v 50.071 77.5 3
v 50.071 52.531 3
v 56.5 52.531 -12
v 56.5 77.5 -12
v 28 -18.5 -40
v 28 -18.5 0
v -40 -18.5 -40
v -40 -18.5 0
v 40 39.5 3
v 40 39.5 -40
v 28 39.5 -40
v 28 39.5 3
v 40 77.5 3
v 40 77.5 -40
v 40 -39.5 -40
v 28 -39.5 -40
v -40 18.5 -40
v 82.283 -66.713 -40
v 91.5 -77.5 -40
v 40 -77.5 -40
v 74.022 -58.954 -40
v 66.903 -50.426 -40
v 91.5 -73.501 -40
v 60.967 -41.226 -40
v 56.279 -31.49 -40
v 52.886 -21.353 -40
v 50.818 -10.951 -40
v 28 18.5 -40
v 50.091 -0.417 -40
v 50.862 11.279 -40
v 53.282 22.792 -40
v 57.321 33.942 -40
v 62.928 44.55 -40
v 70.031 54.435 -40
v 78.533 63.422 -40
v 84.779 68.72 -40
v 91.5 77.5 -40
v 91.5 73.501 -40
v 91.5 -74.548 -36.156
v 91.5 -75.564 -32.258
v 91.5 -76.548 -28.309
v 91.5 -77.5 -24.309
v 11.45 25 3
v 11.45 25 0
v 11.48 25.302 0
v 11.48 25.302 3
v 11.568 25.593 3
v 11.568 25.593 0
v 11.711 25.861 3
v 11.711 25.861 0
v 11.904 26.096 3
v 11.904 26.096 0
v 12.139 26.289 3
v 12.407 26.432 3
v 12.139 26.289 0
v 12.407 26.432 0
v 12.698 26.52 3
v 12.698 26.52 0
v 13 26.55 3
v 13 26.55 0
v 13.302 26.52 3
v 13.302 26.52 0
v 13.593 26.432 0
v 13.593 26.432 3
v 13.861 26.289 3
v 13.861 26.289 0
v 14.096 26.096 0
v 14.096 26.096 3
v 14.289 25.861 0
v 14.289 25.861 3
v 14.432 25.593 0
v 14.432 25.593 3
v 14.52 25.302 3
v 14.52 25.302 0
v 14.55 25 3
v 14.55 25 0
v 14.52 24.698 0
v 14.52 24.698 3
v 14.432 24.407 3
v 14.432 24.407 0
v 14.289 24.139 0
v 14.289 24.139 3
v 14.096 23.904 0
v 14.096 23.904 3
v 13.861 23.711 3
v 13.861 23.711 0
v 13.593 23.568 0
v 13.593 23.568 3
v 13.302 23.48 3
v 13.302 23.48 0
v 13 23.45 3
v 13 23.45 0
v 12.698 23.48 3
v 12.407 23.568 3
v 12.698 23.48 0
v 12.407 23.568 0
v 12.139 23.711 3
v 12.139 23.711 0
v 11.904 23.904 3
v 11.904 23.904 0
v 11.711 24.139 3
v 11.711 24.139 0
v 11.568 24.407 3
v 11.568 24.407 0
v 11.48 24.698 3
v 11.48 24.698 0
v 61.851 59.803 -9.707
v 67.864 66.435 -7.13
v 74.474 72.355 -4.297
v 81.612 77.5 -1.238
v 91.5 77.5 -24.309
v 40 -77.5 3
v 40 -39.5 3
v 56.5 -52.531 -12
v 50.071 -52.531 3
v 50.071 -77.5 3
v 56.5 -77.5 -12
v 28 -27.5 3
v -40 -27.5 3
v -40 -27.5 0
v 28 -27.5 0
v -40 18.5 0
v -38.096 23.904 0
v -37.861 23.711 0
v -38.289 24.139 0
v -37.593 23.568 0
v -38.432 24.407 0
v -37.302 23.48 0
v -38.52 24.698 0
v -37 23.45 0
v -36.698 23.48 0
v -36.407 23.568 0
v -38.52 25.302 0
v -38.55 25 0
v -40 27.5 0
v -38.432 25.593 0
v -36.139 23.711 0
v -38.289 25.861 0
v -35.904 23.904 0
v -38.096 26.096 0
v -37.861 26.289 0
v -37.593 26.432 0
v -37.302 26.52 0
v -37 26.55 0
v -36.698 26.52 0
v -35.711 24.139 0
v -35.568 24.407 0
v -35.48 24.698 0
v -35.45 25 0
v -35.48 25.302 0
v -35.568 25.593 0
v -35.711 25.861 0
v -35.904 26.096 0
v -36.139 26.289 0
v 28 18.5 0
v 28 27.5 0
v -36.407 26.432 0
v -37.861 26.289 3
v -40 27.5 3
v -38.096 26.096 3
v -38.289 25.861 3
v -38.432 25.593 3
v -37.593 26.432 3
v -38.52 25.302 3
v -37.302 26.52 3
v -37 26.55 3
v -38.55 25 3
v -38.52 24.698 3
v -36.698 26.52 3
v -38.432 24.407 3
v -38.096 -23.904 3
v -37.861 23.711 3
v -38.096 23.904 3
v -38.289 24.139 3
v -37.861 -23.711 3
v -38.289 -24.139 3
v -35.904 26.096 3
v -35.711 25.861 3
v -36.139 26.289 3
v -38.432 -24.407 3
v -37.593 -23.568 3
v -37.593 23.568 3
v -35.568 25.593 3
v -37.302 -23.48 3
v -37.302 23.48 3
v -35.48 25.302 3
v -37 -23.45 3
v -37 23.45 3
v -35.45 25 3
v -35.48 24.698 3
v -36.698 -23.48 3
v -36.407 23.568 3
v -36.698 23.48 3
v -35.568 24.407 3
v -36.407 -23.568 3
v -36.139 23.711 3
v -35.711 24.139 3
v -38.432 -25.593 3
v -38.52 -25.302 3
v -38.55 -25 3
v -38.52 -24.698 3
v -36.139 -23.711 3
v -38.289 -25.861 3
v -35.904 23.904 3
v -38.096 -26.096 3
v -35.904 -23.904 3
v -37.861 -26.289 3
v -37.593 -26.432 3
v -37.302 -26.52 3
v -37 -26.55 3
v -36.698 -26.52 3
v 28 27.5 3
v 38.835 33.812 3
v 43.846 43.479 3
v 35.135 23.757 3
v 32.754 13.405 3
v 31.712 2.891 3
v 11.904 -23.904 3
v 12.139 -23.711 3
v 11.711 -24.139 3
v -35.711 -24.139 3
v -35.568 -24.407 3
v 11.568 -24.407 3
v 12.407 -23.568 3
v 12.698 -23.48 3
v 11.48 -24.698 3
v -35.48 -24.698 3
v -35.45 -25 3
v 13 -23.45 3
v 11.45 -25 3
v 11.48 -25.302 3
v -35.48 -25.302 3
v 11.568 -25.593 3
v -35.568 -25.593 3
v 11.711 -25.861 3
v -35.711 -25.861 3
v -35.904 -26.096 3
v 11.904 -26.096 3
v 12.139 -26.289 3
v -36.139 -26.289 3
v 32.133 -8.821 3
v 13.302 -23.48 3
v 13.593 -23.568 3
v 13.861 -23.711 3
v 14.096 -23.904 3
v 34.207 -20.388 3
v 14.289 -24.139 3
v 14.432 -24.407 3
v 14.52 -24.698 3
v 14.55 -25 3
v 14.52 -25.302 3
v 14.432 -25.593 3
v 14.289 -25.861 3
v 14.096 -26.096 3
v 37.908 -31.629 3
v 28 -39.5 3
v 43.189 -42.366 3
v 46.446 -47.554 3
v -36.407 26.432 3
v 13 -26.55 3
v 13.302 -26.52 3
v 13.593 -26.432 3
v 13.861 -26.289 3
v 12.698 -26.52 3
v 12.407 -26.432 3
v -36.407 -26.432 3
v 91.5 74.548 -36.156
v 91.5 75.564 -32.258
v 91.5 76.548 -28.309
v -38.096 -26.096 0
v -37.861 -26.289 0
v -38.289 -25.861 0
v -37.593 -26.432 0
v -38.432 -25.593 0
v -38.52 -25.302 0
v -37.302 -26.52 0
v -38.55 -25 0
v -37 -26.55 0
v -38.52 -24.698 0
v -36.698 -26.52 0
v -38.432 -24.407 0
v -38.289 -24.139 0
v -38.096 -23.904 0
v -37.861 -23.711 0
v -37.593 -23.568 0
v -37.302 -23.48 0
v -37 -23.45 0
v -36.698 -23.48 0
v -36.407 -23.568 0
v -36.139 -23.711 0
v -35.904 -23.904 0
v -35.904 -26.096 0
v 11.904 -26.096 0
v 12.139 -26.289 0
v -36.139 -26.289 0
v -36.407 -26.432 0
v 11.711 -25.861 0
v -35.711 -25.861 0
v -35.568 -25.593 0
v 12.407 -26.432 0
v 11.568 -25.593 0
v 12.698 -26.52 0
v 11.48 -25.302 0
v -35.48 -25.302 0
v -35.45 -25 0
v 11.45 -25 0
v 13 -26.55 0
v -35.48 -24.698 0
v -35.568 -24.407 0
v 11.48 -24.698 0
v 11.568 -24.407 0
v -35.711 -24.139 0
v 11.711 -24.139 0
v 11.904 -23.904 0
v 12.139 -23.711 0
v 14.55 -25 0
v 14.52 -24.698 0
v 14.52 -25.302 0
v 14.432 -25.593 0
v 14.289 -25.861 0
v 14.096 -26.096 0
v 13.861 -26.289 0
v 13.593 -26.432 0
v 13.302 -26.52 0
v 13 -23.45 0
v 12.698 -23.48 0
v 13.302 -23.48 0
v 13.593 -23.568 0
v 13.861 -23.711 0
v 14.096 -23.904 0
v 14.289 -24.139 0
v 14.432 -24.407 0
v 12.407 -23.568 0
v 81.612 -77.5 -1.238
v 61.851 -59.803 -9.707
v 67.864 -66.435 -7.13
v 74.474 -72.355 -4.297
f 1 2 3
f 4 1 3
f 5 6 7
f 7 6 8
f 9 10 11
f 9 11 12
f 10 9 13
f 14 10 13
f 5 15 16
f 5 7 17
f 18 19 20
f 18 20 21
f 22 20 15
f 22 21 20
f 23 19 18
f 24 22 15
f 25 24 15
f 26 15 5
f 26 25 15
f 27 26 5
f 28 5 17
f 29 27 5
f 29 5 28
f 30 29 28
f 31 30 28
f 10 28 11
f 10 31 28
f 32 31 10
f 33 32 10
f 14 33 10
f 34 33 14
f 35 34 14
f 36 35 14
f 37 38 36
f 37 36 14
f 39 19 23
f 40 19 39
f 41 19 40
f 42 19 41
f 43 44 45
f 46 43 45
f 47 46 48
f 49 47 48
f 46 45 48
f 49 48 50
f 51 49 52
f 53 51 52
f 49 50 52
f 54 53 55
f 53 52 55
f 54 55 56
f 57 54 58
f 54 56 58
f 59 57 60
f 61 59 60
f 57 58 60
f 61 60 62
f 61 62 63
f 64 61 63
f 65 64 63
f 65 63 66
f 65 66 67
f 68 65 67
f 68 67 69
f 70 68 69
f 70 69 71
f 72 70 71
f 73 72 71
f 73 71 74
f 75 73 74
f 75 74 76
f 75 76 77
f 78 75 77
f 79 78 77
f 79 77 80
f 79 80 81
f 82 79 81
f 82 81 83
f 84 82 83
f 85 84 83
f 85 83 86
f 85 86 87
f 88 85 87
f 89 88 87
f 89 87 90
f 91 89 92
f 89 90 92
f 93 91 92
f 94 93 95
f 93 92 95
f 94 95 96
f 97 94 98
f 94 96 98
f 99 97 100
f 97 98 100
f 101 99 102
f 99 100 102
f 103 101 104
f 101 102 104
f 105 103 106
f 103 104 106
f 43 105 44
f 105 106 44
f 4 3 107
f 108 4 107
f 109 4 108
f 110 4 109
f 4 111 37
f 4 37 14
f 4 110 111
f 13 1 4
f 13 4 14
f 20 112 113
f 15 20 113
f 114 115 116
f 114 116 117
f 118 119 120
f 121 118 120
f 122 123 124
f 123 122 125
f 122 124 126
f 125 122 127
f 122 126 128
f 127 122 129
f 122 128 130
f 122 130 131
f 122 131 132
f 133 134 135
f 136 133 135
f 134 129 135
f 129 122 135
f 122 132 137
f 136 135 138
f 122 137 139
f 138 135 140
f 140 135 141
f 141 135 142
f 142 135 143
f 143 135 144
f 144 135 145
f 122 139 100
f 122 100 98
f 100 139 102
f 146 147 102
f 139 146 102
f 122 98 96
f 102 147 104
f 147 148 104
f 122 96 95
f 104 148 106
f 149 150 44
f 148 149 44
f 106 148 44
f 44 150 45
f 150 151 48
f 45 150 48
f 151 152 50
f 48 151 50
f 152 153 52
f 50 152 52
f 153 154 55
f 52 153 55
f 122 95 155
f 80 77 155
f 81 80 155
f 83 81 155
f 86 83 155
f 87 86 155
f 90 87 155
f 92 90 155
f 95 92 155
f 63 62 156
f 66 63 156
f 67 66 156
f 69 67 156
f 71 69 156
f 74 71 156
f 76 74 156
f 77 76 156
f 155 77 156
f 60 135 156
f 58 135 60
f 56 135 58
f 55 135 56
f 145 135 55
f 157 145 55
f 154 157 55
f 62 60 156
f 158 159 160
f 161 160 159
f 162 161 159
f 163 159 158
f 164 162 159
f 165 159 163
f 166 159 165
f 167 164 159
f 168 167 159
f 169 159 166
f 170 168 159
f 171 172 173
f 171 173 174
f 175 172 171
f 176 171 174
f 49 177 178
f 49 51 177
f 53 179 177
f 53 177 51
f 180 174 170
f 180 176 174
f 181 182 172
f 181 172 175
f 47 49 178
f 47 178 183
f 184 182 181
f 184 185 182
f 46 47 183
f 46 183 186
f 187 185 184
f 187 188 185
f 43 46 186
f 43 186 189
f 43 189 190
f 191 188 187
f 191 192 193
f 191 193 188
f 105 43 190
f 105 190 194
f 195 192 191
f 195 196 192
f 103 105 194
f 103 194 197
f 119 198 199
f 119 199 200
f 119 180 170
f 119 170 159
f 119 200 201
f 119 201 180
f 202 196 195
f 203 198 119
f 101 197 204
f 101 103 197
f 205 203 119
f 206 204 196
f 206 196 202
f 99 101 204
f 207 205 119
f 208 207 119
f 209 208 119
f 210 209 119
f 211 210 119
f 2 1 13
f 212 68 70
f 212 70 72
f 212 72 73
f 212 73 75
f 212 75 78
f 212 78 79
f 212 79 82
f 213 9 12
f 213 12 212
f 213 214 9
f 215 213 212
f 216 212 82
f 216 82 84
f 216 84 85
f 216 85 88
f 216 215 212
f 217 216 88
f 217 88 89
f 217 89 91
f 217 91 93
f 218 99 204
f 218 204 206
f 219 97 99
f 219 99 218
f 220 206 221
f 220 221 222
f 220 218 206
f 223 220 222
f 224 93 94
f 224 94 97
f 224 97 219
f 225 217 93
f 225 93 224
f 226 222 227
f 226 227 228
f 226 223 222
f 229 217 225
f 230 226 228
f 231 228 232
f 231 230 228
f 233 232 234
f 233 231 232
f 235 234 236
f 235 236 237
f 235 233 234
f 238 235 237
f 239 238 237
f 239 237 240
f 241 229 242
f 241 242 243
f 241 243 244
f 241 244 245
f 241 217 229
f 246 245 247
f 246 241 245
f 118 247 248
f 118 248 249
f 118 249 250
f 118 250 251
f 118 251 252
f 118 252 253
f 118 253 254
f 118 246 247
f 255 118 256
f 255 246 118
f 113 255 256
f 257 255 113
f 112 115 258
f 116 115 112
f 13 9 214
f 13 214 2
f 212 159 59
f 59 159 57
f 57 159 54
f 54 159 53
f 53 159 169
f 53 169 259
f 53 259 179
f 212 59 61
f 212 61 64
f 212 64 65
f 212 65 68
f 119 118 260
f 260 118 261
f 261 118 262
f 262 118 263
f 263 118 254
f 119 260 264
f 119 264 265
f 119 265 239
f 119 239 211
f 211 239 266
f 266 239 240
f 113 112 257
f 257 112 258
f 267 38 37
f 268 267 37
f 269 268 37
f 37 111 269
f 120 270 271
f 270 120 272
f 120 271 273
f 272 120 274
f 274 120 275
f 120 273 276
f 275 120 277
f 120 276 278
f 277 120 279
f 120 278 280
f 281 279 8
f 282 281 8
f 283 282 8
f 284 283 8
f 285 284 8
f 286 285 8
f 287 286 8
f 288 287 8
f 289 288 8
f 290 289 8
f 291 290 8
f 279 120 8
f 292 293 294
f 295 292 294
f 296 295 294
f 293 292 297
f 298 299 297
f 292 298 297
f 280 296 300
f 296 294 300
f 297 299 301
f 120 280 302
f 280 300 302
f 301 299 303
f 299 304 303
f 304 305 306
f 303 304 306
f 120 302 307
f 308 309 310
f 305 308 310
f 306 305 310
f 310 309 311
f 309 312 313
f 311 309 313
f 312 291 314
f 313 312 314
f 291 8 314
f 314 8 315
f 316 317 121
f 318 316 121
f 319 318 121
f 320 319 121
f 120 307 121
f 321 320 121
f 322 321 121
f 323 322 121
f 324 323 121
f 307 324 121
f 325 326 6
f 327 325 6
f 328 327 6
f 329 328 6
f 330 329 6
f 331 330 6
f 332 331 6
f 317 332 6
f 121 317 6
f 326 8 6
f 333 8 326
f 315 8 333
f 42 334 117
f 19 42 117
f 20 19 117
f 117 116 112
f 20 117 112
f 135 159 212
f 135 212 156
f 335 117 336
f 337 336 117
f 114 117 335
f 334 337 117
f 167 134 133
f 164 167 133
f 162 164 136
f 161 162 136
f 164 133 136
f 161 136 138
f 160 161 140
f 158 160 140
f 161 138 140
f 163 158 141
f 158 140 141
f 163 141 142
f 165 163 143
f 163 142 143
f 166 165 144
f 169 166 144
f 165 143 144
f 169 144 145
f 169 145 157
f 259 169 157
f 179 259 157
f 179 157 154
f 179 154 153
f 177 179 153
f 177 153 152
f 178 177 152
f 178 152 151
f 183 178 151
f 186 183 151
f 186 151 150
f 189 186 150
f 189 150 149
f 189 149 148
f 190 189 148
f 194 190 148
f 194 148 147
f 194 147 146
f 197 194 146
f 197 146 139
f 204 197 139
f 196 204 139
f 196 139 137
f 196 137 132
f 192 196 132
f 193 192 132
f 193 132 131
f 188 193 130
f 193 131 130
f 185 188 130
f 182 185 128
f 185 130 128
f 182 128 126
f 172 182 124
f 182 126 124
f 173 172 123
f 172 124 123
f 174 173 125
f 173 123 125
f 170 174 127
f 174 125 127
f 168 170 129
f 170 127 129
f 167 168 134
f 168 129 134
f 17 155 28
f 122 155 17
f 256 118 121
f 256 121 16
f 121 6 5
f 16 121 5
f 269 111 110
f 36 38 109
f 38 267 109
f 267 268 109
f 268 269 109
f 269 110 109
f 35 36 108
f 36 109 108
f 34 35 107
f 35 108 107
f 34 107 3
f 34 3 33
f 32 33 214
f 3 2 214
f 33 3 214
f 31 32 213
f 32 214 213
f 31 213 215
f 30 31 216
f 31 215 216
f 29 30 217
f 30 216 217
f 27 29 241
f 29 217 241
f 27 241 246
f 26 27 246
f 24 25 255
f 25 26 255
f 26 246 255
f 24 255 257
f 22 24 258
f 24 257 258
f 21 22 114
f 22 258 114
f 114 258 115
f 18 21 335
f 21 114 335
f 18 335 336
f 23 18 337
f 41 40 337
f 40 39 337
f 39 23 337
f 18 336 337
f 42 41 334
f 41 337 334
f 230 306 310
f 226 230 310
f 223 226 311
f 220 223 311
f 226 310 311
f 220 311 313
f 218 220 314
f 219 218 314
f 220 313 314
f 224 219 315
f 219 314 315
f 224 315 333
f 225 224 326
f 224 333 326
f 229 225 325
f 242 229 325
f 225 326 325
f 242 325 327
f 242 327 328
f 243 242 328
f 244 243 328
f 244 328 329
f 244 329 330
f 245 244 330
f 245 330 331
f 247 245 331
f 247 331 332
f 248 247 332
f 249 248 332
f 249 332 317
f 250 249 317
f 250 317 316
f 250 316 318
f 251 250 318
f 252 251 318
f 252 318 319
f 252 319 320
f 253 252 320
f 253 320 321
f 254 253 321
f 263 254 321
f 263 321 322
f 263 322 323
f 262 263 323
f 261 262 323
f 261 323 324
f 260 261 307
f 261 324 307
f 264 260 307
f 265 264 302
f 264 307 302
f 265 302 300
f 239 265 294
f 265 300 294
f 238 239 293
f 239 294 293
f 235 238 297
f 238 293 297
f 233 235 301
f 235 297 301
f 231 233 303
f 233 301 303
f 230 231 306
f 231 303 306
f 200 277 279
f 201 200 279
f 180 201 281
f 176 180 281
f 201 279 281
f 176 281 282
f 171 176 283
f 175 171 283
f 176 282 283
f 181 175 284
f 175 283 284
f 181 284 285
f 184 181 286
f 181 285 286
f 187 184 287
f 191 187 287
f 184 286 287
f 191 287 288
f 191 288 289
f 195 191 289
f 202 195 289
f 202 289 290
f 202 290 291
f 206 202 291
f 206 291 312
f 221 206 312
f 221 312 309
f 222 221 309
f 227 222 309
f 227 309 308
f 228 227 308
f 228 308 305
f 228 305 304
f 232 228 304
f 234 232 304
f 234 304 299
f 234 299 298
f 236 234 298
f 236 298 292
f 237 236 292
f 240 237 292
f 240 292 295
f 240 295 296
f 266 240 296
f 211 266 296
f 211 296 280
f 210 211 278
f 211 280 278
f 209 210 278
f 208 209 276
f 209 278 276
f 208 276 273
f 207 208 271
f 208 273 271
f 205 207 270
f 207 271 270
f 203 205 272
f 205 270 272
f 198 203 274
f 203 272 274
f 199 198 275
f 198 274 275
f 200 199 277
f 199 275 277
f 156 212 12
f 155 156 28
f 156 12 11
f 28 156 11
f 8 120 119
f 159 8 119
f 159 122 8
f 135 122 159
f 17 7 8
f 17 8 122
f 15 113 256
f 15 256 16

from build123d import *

# Parameters (mm, degrees)
SKETCH_1_W          = 80
SKETCH_1_H          = 55
EXTRUDE_1_DEPTH     = 3
SKETCH_2_R          = 1.55
CUT_EXTRUDE_1_DEPTH = 24.5
SKETCH_3_W          = 3
SKETCH_3_H          = 55
EXTRUDE_2_DEPTH     = 1.5
SKETCH_5_W          = 3
SKETCH_5_H          = 55
EXTRUDE_3_DEPTH     = 50
SKETCH_6_W          = 51.5
SKETCH_6_H          = 3
EXTRUDE_4_DEPTH     = 50
SKETCH_7_W          = 51.5
SKETCH_7_H          = 3
EXTRUDE_5_DEPTH     = 50
SKETCH_8_W          = 51.5
SKETCH_8_H          = 155
EXTRUDE_6_DEPTH     = 40
EXTRUDE_7_DEPTH     = 12
CUT_EXTRUDE_2_DEPTH = 184
SKETCH_13_R         = 90
CUT_EXTRUDE_3_DEPTH = 92
SKETCH_14_W         = 68
SKETCH_14_H         = 37
EXTRUDE_8_DEPTH     = 40


with BuildPart() as part:
    # 草图1 → 凸台-拉伸1 (new body)
    with BuildSketch(Plane.XY):
        Rectangle(SKETCH_1_W, SKETCH_1_H)
    extrude(amount=EXTRUDE_1_DEPTH)

    # 草图2 → 切除-拉伸1 (cut)
    with BuildSketch(Plane(origin=(0, 0, 0), x_dir=(-1, 0, 0), z_dir=(0, 0, -1))):
        with Locations((37, 25)):
            Circle(SKETCH_2_R)
        with Locations((37, -25)):
            Circle(SKETCH_2_R)
        with Locations((-13, 25)):
            Circle(SKETCH_2_R)
        with Locations((-13, -25)):
            Circle(SKETCH_2_R)
    extrude(amount=-CUT_EXTRUDE_1_DEPTH, mode=Mode.SUBTRACT)



with BuildPart() as body_2:
    # 草图3 → 凸台-拉伸2 (new body)
    with BuildSketch(Plane(origin=(40, 0, 0), x_dir=(0, 0, -1), z_dir=(1, 0, 0))):
        with Locations((-1.5, 0)):
            Rectangle(SKETCH_3_W, SKETCH_3_H)
    extrude(amount=EXTRUDE_2_DEPTH)

    # 草图5 → 凸台-拉伸3 (add)
    with BuildSketch(Plane(origin=(41.5, 0, 0), x_dir=(0, 0, -1), z_dir=(1, 0, 0))):
        with Locations((-1.5, 0)):
            Rectangle(SKETCH_5_W, SKETCH_5_H)
    extrude(amount=EXTRUDE_3_DEPTH)


with BuildPart() as part_1:
    add(part.part)

    add(body_2.part)  # 凸台-拉伸4 merges body 2
    # 草图6 → 凸台-拉伸4 (add)
    with BuildSketch(Plane(origin=(0, 27.5, 0), x_dir=(1, 0, 0), z_dir=(0, 1, 0))):
        with Locations((65.75, -1.5)):
            Rectangle(SKETCH_6_W, SKETCH_6_H)
    extrude(amount=EXTRUDE_4_DEPTH)

    # 草图7 → 凸台-拉伸5 (add)
    with BuildSketch(Plane.XZ.offset(27.5)):
        with Locations((65.75, 1.5)):
            Rectangle(SKETCH_7_W, SKETCH_7_H)
    extrude(amount=EXTRUDE_5_DEPTH)

    # 草图8 → 凸台-拉伸6 (add)
    with BuildSketch(Plane(origin=(0, 0, 0), x_dir=(-1, 0, 0), z_dir=(0, 0, -1))):
        with Locations((-65.75, 0)):
            Rectangle(SKETCH_8_W, SKETCH_8_H)
    extrude(amount=EXTRUDE_6_DEPTH)

    # 草图9 → 凸台-拉伸7 (add)
    with BuildSketch(Plane.ZY.offset(-40)):
        Polygon((-40, 39.5), (3, 39.5), (3, 27.5), (0, 27.5), (0, -27.5), (3, -27.5), (3, -39.5), (-40, -39.5), align=None)
    extrude(amount=EXTRUDE_7_DEPTH)

    # 草图10 → 切除-拉伸2 (cut)
    with BuildSketch(Plane(origin=(0, 77.5, 0), x_dir=(1, 0, 0), z_dir=(0, 1, 0))):
        Polygon((56.5, 12), (91.5, -3), (50.071428571, -3), align=None)
    extrude(amount=-CUT_EXTRUDE_2_DEPTH, mode=Mode.SUBTRACT)

    # 草图13 → 切除-拉伸3 (cut, symmetric)
    with BuildSketch(Plane(origin=(13.112068966, 0, -30.594827586), x_dir=(0.9191450300180579, 0, 0.39391929857916774), z_dir=(-0.39391929857916774, 0, 0.9191450300180579))):
        with Locations((120.283528142, 0)):
            Circle(SKETCH_13_R)
    extrude(amount=CUT_EXTRUDE_3_DEPTH, both=True, mode=Mode.SUBTRACT)

    # 草图14 → 凸台-拉伸8 (add)
    with BuildSketch(Plane(origin=(0, 0, 0), x_dir=(-1, 0, 0), z_dir=(0, 0, -1))):
        with Locations((6, 0)):
            Rectangle(SKETCH_14_W, SKETCH_14_H)
    extrude(amount=EXTRUDE_8_DEPTH)


solid = part_1.part
